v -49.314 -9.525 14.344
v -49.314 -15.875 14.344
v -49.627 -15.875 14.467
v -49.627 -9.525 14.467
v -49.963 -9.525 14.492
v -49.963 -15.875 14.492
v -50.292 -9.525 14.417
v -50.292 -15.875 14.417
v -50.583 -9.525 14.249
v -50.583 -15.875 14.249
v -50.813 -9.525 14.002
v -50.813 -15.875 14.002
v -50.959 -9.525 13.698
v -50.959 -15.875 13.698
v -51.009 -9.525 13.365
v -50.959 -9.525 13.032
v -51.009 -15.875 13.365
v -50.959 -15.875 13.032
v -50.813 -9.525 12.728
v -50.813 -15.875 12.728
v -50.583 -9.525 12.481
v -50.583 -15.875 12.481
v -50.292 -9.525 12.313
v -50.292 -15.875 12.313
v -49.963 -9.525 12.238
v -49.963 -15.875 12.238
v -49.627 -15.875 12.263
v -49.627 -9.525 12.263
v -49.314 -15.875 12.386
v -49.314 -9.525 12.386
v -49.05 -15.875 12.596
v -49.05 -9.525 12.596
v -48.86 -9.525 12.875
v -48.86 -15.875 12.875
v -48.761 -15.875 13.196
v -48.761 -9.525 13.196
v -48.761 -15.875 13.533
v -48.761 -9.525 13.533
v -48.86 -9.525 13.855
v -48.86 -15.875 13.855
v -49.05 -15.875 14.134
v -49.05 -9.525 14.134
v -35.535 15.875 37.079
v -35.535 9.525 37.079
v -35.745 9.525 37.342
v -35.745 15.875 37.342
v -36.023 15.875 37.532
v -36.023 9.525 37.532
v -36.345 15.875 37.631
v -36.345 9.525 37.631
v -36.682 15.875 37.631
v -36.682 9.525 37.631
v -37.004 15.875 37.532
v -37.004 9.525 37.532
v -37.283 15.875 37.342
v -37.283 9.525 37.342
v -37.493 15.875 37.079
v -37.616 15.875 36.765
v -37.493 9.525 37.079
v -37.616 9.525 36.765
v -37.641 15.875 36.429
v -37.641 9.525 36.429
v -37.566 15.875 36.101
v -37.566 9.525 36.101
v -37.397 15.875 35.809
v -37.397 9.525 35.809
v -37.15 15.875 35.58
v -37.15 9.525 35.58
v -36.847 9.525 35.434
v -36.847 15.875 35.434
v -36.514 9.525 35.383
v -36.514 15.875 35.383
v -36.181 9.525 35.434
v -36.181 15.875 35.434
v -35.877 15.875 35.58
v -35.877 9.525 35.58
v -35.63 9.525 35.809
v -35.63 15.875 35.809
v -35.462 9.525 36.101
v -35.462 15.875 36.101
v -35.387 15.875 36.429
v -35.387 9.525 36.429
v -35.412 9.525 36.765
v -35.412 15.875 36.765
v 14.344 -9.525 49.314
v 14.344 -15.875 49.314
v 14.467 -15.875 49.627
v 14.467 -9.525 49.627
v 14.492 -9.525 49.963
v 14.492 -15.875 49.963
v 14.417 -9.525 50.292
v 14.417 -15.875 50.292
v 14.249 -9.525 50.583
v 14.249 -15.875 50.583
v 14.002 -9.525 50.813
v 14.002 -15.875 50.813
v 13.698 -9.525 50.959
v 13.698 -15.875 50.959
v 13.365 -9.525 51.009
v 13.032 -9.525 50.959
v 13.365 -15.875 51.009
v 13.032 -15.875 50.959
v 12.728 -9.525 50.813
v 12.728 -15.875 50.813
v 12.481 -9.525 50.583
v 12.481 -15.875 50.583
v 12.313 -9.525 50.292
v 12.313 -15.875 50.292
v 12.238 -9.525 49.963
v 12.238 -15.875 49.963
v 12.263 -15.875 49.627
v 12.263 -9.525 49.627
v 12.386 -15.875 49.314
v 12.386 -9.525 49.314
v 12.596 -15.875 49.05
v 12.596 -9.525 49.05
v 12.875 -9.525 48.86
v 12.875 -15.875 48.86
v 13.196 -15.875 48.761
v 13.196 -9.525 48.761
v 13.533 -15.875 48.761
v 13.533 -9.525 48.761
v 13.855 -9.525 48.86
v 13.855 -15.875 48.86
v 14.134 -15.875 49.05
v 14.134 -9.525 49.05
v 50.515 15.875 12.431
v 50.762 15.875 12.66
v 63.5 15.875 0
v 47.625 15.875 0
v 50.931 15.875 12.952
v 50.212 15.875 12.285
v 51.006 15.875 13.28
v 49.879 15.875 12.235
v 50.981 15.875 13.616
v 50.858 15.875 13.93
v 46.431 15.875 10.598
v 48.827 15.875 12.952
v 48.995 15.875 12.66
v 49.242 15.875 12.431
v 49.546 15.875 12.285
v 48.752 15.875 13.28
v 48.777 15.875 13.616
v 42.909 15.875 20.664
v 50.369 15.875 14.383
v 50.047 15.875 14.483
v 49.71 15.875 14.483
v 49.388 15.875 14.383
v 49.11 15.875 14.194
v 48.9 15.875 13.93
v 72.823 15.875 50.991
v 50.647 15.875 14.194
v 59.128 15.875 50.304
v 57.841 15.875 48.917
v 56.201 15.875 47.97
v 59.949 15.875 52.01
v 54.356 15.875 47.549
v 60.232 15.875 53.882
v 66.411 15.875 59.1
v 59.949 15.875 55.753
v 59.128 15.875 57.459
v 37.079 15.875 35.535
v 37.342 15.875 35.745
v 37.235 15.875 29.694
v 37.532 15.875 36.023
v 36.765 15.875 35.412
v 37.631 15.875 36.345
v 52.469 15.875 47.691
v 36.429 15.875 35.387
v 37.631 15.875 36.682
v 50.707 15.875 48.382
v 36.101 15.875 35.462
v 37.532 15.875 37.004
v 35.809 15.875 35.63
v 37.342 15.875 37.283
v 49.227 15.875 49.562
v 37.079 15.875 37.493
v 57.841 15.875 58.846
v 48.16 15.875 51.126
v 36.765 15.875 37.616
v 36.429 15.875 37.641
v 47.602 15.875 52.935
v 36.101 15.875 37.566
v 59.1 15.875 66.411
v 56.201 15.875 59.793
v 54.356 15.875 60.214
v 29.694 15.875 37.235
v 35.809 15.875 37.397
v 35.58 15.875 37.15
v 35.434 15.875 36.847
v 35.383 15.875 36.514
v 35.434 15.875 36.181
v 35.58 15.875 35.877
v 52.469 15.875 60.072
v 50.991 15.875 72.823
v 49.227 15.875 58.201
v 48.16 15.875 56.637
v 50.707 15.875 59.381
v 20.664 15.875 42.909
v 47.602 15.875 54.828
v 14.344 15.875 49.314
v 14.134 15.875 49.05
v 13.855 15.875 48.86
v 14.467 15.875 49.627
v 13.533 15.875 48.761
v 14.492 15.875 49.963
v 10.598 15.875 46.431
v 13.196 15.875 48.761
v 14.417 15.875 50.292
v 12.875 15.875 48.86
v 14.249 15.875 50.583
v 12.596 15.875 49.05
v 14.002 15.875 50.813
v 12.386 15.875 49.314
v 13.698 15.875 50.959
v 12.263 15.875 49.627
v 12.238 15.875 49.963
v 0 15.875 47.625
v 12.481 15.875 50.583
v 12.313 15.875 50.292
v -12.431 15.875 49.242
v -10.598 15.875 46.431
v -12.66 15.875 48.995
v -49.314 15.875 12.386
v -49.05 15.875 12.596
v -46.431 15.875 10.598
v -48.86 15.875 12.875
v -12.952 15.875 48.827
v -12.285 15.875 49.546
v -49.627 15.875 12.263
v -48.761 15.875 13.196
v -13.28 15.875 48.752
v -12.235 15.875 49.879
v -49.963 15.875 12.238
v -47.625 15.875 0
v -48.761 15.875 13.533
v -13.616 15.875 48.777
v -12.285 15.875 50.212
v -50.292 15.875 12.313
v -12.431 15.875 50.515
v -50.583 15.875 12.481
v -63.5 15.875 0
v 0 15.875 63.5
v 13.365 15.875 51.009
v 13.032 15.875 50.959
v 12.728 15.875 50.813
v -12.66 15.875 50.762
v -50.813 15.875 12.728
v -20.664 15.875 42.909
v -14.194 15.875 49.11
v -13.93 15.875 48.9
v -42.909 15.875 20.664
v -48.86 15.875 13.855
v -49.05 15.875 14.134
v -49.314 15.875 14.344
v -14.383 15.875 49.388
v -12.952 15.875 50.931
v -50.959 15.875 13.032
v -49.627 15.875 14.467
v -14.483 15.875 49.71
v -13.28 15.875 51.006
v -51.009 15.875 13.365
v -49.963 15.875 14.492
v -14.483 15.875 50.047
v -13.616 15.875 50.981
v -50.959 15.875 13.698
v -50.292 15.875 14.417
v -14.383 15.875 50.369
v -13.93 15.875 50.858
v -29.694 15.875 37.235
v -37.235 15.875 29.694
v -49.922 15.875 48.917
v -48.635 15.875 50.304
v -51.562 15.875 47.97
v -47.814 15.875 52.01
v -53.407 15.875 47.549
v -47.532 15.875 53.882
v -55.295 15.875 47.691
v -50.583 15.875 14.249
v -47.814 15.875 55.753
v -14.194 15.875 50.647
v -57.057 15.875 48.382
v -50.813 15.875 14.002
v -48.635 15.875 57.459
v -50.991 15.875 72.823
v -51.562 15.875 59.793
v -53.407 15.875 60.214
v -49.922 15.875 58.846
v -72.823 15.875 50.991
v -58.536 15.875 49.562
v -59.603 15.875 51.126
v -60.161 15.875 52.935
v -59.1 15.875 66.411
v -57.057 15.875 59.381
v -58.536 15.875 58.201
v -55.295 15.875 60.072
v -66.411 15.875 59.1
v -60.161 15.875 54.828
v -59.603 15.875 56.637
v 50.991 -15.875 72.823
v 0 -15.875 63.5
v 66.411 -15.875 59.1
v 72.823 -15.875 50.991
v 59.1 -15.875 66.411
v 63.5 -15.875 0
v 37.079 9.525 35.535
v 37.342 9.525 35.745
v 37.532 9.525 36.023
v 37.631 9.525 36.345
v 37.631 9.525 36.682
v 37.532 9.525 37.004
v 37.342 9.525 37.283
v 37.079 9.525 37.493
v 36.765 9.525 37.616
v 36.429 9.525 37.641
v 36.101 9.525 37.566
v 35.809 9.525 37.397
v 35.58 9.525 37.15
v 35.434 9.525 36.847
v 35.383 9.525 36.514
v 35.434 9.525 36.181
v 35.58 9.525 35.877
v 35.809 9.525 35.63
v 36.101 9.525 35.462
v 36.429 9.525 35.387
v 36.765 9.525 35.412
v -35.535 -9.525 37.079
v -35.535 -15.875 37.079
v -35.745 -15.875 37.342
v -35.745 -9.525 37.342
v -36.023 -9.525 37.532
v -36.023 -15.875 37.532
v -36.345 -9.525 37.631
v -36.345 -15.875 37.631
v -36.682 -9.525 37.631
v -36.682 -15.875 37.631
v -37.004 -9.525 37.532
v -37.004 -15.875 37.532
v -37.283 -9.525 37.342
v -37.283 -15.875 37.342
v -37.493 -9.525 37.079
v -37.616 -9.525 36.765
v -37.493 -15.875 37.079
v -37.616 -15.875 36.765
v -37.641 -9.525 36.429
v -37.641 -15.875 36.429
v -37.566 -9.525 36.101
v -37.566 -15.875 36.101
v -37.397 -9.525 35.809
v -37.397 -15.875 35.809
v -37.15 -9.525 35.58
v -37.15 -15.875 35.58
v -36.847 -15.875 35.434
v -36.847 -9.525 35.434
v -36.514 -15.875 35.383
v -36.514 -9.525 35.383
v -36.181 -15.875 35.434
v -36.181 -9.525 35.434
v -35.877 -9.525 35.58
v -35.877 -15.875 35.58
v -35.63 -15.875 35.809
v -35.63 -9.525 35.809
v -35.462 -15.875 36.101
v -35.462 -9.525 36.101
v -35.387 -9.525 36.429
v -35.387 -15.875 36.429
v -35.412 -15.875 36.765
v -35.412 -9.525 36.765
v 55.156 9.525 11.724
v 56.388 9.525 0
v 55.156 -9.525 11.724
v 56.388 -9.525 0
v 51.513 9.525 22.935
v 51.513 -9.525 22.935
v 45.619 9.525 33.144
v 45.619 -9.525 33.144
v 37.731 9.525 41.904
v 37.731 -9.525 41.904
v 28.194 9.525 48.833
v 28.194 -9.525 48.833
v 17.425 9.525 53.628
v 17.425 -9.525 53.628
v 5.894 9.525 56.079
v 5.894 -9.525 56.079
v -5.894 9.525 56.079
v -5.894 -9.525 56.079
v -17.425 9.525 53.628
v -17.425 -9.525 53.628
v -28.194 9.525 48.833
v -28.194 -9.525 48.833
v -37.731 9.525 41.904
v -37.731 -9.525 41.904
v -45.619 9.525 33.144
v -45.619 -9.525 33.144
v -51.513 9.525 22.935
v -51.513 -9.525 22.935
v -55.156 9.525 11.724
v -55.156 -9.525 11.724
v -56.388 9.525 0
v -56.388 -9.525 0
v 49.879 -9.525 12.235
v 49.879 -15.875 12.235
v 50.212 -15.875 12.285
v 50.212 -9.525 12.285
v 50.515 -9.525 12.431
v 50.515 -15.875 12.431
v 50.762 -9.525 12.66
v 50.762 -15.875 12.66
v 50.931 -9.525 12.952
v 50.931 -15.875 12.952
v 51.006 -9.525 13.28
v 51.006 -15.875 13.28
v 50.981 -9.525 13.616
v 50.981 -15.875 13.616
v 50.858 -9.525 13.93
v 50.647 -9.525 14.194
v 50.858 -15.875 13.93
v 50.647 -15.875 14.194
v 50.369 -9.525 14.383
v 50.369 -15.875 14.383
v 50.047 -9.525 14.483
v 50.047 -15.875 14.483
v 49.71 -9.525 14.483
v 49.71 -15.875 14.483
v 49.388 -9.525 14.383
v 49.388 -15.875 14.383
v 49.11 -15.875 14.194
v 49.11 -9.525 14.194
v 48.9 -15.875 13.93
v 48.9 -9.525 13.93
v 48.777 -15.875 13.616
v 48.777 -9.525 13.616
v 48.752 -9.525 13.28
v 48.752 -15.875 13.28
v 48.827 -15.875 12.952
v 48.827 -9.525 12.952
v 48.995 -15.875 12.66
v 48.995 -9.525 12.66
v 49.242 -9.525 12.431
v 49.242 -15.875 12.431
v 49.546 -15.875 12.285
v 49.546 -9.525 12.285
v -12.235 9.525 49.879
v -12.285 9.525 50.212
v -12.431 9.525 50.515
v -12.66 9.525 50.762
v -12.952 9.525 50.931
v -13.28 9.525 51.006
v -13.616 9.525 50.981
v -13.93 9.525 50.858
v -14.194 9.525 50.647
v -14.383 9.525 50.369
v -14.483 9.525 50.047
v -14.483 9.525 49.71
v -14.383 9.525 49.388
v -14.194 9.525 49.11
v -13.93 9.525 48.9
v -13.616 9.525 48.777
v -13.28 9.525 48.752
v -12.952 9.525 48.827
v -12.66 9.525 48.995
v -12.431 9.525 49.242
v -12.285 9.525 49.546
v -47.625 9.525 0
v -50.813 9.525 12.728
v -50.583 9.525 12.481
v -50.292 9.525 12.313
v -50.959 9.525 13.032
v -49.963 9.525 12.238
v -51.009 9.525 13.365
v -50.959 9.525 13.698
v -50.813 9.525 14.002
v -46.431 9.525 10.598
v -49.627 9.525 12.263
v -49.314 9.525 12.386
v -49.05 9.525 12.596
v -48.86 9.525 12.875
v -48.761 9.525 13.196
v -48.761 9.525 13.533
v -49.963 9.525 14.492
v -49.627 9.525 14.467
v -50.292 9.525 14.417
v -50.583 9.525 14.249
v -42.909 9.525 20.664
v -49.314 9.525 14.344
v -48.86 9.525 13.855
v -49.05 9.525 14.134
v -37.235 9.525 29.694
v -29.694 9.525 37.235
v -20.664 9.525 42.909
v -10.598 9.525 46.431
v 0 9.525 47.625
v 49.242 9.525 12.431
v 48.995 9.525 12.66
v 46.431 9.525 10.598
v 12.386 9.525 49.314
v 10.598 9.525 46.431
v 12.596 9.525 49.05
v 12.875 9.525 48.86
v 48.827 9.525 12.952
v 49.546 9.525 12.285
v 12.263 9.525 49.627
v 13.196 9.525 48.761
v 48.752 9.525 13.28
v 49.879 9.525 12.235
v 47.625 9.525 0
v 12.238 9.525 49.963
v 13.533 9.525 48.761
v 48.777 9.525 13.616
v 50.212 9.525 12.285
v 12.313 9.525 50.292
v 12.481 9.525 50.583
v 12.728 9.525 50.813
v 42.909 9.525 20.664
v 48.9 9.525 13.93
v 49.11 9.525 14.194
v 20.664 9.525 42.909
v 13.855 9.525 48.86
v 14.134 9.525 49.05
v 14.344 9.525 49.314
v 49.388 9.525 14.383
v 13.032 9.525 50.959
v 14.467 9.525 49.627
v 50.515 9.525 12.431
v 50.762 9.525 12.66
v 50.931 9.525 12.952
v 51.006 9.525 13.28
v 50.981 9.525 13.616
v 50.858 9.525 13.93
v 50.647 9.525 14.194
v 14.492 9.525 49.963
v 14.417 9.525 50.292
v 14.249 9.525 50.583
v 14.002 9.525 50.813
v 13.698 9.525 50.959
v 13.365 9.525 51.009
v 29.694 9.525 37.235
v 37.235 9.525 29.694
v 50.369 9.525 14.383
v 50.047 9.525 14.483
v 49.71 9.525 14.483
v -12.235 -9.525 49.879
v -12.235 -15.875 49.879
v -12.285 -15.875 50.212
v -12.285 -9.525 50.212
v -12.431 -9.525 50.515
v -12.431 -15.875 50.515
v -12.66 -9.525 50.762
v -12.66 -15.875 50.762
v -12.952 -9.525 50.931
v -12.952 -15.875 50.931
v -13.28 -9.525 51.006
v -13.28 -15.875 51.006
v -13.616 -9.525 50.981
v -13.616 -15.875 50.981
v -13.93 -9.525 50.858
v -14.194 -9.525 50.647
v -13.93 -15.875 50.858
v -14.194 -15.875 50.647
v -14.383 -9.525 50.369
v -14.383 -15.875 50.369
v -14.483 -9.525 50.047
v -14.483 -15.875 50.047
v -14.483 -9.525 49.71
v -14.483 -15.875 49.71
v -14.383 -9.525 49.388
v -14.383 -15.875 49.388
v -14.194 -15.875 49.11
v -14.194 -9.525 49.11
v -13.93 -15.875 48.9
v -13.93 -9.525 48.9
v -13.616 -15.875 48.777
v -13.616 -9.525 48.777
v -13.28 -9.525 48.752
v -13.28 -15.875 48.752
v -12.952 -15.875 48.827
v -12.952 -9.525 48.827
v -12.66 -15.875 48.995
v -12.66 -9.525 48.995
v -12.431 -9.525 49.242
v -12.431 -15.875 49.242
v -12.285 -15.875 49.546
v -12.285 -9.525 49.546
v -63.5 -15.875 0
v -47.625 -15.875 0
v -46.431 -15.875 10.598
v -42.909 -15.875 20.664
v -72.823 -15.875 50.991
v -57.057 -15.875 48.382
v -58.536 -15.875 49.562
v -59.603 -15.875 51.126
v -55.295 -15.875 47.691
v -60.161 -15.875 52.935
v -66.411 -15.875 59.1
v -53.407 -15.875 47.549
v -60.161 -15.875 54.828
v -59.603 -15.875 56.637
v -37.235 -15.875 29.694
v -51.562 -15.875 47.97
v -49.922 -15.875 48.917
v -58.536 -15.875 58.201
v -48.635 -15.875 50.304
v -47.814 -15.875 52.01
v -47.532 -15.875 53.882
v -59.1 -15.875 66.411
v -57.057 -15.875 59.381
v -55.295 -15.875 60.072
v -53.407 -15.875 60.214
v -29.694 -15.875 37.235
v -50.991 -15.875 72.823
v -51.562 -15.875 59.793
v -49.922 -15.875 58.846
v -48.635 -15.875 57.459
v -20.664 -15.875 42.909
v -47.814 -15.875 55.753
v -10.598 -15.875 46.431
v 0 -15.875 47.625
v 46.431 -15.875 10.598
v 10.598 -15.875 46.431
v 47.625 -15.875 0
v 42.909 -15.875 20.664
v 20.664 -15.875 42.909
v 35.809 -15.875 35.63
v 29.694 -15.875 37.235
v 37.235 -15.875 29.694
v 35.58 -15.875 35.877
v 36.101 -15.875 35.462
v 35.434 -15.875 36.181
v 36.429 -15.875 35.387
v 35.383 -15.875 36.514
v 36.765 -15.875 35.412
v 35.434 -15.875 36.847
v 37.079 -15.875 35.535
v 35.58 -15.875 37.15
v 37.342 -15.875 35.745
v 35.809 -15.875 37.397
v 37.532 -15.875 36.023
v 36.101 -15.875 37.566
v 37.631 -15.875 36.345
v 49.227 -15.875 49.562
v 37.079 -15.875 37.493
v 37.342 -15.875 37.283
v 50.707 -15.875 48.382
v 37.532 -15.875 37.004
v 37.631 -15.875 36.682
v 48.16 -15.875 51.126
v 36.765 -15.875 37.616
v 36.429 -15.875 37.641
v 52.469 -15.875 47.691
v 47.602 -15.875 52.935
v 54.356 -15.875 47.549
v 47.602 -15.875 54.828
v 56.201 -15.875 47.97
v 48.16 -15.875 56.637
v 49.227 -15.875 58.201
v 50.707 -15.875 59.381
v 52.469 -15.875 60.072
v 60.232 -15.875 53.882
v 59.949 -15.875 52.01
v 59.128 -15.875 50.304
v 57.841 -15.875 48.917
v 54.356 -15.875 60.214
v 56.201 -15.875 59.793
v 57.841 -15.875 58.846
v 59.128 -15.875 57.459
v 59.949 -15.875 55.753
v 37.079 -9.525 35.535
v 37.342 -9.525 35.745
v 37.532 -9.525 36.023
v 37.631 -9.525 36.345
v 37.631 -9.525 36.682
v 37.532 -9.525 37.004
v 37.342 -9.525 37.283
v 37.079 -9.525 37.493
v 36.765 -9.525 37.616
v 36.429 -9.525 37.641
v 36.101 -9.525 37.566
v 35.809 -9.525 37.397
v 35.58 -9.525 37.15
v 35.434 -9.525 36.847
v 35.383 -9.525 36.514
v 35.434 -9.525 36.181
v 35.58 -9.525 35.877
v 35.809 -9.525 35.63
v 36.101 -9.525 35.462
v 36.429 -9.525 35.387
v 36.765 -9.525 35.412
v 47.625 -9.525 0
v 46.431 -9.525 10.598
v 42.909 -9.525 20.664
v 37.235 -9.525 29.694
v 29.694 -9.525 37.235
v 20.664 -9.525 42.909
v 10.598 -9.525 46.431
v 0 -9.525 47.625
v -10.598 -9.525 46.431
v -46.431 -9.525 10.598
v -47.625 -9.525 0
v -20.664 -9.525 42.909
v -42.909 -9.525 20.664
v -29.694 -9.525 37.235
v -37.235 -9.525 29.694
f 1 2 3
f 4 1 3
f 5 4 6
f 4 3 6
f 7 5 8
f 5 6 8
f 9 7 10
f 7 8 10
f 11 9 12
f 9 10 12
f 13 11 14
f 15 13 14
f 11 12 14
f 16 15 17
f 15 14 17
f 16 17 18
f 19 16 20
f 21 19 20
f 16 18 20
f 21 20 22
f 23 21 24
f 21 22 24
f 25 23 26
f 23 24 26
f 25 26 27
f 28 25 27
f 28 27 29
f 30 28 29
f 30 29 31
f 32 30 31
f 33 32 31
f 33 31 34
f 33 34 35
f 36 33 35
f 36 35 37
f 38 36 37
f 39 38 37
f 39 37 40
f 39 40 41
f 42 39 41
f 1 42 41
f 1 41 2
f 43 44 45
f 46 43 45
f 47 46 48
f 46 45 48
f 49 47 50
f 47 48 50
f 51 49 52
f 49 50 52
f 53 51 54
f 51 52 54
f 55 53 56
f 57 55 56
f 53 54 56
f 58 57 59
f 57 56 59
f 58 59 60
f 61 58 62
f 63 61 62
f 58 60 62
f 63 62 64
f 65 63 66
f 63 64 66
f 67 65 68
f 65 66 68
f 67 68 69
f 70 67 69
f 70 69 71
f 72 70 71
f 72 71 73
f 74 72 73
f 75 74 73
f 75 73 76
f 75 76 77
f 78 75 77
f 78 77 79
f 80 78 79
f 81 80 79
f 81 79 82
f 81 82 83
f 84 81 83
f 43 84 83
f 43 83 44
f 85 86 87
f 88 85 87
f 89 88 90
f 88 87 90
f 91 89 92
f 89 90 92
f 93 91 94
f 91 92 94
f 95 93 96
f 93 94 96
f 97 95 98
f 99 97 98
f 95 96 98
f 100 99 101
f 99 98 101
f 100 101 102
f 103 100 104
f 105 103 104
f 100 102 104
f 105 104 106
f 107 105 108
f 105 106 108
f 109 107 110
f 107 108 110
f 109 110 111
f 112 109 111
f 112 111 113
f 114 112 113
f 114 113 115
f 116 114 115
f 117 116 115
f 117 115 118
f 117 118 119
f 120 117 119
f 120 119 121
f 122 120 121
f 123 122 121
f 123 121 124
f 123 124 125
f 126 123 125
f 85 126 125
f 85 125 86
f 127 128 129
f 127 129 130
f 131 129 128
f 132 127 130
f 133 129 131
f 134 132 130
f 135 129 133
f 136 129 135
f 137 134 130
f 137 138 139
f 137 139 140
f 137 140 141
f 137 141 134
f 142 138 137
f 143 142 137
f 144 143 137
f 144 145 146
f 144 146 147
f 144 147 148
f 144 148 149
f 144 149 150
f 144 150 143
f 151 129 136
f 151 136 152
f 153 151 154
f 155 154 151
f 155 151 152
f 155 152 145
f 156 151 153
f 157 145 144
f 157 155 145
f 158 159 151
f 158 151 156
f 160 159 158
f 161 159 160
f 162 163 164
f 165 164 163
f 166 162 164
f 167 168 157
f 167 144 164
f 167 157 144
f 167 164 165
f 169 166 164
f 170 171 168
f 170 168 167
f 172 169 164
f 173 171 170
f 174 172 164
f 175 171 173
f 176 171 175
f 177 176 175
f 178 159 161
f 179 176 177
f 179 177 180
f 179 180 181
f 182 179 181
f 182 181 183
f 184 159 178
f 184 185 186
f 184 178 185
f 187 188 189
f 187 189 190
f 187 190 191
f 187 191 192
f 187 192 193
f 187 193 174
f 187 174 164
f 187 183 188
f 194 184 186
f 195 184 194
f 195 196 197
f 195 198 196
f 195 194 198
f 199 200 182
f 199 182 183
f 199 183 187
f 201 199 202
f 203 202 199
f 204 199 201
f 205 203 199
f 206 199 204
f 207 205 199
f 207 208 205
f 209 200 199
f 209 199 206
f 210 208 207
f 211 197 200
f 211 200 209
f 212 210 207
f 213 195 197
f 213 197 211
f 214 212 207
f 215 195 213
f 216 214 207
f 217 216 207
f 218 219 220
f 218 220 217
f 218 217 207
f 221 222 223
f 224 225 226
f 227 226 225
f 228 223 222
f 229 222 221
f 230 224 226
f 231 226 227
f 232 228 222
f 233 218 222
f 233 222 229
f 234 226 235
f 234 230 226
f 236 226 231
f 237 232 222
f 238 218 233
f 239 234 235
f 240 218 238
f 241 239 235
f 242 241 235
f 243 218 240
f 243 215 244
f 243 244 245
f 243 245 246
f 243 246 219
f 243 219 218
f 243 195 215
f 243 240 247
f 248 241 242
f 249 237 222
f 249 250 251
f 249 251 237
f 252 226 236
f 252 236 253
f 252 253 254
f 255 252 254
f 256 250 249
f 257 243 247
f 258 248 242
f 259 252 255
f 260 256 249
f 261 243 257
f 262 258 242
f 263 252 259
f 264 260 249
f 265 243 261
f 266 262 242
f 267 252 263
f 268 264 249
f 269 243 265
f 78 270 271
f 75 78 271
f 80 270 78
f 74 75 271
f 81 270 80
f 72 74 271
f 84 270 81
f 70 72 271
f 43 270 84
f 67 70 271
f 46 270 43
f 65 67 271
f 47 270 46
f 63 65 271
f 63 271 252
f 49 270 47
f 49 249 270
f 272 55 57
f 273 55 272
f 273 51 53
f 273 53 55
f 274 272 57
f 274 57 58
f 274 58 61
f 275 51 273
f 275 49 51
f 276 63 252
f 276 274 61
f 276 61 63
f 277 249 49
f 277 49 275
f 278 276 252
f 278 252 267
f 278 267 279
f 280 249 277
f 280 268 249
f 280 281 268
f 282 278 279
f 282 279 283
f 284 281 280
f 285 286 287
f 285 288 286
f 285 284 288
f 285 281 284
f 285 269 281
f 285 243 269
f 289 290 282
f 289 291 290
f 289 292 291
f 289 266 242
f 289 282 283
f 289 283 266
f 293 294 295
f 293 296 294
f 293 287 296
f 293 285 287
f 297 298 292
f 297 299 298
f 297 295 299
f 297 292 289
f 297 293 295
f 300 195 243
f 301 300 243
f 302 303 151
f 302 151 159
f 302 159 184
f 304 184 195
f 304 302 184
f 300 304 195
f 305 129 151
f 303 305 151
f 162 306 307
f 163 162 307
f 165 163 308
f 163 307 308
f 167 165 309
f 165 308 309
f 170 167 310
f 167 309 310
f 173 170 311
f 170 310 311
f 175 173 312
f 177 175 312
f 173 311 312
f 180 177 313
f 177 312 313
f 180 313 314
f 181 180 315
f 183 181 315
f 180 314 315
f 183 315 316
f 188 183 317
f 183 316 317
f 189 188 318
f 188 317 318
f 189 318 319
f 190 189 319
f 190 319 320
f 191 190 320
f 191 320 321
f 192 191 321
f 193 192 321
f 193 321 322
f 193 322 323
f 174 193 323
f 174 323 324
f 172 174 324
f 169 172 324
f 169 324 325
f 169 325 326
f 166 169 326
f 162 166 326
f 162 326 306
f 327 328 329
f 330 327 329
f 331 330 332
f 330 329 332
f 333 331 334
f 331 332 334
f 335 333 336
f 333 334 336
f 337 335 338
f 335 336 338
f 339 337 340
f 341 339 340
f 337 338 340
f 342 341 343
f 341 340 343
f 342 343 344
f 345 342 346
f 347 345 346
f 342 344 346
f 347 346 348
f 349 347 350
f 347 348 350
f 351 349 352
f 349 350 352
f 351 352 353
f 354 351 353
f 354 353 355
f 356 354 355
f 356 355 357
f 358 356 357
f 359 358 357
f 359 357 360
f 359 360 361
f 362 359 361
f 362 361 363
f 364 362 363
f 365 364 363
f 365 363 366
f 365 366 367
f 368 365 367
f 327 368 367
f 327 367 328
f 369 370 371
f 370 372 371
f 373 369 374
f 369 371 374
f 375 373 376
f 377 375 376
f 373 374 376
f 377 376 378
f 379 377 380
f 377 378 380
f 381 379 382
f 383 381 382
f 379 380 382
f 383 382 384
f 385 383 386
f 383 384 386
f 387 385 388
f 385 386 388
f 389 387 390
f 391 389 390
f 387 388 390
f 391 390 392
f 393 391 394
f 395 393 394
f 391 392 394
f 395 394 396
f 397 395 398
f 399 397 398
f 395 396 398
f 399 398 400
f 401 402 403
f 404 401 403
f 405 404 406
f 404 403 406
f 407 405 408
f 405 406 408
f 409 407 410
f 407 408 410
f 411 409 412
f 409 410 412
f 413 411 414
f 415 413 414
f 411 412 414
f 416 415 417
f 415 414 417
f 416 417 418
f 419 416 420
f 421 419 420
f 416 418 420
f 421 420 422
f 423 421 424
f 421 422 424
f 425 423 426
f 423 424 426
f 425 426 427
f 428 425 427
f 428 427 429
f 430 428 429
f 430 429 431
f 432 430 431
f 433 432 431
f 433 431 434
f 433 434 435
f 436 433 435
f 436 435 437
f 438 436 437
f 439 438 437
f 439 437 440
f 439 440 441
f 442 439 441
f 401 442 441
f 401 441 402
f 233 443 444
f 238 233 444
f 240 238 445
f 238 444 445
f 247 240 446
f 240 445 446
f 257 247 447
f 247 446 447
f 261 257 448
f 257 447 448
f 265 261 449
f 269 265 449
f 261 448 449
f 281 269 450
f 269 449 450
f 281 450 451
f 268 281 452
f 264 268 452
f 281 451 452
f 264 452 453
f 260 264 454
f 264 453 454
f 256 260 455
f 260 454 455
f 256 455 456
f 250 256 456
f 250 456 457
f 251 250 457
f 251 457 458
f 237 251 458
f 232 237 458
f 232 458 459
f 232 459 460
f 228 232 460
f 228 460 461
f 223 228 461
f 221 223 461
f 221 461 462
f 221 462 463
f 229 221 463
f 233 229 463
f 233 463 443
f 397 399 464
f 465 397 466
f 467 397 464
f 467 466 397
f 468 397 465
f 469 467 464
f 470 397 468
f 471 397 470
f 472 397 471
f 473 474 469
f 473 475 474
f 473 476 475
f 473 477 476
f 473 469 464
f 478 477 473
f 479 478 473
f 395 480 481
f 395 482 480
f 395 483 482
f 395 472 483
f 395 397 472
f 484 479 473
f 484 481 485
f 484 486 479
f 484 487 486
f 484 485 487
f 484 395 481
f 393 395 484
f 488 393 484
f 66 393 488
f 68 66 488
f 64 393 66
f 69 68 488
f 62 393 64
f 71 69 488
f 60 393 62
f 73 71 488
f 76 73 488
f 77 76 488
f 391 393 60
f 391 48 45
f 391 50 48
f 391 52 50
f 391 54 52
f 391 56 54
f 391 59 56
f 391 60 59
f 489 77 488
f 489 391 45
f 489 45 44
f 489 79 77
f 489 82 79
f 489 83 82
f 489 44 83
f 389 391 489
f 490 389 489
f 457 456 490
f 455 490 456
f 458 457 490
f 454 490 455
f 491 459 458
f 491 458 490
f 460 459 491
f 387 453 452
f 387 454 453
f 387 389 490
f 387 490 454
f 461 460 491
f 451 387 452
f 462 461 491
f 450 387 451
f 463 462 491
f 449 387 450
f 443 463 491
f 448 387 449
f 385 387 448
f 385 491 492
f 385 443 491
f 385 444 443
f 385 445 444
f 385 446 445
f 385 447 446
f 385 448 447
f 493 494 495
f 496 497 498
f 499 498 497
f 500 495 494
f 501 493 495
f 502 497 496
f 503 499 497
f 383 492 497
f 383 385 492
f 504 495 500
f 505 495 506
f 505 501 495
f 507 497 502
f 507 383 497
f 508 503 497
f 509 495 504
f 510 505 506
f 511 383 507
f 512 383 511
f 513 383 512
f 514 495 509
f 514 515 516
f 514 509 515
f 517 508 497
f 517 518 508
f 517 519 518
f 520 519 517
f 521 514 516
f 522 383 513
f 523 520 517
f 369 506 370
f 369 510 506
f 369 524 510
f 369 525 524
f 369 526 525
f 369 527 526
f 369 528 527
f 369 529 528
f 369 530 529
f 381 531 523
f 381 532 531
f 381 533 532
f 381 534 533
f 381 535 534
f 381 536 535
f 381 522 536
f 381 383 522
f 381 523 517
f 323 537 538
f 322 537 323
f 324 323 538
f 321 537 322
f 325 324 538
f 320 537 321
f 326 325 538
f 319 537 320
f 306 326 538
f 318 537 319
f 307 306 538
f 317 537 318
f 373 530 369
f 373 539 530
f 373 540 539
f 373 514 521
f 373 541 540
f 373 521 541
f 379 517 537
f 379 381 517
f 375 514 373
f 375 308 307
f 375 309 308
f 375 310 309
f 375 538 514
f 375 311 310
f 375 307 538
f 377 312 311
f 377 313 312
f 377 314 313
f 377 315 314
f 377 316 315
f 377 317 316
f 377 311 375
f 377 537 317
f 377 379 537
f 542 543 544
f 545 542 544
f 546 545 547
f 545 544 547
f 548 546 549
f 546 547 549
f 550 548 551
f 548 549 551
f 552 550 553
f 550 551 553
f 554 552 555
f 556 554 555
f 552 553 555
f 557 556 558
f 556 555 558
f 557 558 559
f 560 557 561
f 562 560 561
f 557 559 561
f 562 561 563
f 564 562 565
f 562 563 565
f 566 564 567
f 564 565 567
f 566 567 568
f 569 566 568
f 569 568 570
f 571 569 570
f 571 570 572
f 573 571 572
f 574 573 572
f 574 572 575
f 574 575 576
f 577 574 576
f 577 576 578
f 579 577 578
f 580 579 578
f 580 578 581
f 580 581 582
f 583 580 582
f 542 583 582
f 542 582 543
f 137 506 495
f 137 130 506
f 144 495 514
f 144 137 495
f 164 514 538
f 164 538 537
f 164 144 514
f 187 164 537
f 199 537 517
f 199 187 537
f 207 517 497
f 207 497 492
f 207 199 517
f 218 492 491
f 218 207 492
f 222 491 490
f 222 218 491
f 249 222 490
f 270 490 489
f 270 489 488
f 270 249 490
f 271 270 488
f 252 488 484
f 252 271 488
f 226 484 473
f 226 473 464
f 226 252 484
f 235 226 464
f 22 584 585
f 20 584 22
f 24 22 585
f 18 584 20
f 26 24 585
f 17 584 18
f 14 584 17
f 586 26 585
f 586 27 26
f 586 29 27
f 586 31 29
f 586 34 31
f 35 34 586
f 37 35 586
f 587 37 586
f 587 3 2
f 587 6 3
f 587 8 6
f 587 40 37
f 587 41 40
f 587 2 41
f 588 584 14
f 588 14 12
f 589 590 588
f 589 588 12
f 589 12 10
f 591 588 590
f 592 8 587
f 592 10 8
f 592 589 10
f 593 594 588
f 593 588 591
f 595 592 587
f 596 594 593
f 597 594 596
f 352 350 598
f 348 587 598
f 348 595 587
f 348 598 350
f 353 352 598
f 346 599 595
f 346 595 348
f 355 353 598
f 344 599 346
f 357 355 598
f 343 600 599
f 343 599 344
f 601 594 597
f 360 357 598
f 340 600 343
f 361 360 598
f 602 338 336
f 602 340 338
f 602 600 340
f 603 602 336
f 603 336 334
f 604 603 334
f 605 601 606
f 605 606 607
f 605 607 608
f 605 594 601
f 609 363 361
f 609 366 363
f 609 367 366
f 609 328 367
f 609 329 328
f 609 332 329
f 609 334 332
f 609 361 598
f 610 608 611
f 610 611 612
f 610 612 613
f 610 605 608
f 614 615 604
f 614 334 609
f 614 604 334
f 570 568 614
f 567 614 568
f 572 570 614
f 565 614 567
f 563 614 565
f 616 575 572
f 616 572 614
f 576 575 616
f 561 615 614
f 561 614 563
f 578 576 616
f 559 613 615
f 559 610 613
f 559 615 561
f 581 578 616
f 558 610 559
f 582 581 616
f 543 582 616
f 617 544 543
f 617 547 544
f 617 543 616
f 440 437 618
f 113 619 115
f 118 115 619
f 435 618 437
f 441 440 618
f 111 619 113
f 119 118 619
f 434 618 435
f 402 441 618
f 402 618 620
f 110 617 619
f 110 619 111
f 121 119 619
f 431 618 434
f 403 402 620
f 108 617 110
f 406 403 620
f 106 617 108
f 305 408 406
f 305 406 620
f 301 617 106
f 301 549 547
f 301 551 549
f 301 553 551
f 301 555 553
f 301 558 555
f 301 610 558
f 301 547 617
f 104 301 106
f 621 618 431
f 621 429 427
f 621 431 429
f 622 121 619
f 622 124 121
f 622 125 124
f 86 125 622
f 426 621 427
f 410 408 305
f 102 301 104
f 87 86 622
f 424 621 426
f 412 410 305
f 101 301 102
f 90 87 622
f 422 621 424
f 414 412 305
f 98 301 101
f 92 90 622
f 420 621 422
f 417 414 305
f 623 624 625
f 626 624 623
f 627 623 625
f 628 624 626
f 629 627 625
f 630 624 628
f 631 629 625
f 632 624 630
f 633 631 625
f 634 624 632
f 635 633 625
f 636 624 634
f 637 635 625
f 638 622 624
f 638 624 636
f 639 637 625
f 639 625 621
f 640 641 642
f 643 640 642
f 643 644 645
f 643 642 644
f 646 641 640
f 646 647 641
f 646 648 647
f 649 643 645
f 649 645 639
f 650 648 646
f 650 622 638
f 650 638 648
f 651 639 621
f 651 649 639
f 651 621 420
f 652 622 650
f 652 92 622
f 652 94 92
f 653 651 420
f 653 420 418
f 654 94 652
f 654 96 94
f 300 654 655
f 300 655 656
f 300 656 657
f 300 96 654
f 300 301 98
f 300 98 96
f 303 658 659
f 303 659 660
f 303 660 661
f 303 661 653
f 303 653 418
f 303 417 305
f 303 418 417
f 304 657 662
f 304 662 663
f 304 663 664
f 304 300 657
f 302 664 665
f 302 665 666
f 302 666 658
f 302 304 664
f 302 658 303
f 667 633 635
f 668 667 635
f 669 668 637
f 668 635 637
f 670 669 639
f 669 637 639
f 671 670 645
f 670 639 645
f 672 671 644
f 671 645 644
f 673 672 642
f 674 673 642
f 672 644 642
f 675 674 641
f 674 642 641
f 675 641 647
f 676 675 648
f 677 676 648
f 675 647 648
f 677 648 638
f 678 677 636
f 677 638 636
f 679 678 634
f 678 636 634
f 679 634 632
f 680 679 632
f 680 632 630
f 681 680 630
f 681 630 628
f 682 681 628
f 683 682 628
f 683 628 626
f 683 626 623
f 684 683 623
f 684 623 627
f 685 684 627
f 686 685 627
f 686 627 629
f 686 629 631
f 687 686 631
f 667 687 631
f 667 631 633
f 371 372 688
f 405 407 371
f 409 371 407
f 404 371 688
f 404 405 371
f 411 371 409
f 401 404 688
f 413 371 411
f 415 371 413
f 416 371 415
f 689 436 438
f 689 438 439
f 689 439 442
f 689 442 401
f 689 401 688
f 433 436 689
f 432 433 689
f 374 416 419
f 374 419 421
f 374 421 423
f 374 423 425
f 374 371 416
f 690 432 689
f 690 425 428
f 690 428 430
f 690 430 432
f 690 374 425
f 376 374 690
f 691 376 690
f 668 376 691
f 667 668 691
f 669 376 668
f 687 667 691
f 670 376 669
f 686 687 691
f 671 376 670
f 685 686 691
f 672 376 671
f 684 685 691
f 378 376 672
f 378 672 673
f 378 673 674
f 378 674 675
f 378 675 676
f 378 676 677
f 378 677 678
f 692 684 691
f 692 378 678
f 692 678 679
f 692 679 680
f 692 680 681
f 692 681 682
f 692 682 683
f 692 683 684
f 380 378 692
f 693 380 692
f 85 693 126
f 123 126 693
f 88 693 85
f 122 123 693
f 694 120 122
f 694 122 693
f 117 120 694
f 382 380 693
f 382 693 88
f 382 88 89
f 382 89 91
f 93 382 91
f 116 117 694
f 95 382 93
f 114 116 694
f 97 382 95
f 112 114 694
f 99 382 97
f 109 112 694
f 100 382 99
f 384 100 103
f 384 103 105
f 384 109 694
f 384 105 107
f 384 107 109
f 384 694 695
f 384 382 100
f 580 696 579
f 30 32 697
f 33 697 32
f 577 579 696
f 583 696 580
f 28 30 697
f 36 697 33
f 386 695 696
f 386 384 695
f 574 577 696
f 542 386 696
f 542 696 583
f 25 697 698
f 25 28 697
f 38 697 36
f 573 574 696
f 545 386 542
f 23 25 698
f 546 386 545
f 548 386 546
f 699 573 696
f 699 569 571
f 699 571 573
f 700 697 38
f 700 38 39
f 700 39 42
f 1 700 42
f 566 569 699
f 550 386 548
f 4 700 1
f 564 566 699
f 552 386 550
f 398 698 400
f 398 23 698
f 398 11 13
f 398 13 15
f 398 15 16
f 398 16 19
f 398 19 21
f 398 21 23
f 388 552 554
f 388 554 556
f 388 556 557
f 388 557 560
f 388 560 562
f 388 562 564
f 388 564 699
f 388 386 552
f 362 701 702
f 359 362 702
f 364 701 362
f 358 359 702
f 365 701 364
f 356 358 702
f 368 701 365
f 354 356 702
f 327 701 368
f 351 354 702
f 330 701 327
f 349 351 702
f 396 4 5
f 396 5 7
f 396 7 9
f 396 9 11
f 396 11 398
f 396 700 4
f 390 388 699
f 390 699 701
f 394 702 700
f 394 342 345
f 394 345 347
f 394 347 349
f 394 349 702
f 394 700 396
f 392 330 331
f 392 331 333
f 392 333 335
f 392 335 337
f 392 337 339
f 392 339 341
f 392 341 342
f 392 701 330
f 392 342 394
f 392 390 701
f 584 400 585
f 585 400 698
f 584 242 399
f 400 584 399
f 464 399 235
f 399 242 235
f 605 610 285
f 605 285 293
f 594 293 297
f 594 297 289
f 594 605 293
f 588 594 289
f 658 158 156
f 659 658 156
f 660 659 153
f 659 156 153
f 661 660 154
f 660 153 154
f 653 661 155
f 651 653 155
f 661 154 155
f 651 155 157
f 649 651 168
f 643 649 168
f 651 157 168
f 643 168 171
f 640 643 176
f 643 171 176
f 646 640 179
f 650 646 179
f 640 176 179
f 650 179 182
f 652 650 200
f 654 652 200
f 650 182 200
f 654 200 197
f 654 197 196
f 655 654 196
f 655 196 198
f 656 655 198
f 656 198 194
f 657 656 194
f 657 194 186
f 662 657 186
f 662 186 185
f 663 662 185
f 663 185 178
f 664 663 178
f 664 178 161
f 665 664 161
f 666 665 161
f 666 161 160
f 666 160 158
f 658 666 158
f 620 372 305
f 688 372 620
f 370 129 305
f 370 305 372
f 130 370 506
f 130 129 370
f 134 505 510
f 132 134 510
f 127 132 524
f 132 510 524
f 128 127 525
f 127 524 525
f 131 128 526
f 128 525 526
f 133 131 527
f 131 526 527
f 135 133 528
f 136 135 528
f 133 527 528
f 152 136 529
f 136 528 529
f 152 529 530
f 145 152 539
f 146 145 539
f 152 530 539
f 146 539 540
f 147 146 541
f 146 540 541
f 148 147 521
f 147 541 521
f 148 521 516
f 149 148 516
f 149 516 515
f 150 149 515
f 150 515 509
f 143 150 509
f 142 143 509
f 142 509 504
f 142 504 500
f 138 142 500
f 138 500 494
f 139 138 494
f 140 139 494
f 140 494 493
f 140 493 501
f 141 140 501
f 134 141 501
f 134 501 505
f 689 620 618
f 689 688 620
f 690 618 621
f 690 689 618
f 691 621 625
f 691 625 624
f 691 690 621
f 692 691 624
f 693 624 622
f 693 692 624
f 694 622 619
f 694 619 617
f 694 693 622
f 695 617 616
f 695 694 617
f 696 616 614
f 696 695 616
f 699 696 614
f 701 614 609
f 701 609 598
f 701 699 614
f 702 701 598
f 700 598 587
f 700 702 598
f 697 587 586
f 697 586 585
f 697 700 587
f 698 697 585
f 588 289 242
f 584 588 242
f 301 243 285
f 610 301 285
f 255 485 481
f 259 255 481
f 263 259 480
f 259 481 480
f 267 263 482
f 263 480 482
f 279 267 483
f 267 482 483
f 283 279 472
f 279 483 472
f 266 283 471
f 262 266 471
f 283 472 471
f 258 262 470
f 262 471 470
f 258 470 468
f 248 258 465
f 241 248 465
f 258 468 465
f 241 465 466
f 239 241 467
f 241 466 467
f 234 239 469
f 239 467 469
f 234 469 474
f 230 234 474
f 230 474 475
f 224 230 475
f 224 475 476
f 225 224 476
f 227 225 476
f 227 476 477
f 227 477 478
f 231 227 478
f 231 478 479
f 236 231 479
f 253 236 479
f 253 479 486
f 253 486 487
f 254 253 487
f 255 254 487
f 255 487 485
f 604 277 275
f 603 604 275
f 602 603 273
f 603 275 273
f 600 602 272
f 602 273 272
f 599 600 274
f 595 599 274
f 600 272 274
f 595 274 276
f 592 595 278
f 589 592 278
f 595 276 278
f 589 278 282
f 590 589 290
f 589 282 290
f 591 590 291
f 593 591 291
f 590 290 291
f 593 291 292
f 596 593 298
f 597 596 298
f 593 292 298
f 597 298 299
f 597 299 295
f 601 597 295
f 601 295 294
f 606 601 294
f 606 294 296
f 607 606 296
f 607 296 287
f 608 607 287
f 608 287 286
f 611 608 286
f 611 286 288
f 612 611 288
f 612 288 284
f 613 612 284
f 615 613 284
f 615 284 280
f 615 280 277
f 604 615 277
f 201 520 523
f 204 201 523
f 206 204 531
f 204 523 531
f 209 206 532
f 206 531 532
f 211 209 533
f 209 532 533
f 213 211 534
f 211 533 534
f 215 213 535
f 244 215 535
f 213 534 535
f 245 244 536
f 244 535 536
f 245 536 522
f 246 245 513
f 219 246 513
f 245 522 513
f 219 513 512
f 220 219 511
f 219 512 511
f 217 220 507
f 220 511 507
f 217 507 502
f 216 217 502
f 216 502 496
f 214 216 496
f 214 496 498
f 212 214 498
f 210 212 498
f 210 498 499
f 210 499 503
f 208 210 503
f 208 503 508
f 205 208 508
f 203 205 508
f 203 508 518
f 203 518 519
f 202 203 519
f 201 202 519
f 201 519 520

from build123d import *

# Parameters (mm, degrees)
REVOLVE1_ANGLE                 = 180
TAP_DRILL_FOR_4_40_TAP1_D      = 2.2606
CIRPATTERN1_COUNT              = 12
CUT_EXTRUDE1_REACH             = 90.9
SKETCH4_R                      = 1.1303
CUT_EXTRUDE2_REACH             = 90.9
SKETCH6_R                      = 1.1303
CUT_EXTRUDE2_DIRECTION_2_DEPTH = 1.0000001
CUT_EXTRUDE3_REACH             = 33.75
SKETCH7_R                      = 6.35


with BuildPart() as part:
    # Sketch1 → Revolve1 (revolve)
    with BuildSketch(Plane.XY):
        Polygon((56.388, 0), (56.388, 9.525), (47.625, 9.525), (47.625, 15.875), (88.9, 15.875), (88.9, -15.875), (47.625, -15.875), (47.625, -9.525), (56.388, -9.525), align=None)
    revolve(axis=Axis((0, 22.539286723, 0), (0, -1, 0)), revolution_arc=REVOLVE1_ANGLE)

    # Tap Drill for #4-40 Tap1 (through all)
    with Locations(Plane(origin=(49.878671003, 15.875, 13.364949615), x_dir=(0, 0, 1), z_dir=(0, 1, 0))):
        with Locations((0, 0)):
            tap_drill_for_4_40_tap1 = Hole(TAP_DRILL_FOR_4_40_TAP1_D / 2)

    # CirPattern1: Tap Drill for #4-40 Tap1 ×12 about axis, 6 skipped
    cirpattern1_axis = Axis((0, 15.875, 0), (0, 1, 0))
    add([tap_drill_for_4_40_tap1.rotate(cirpattern1_axis, i * 360 / CIRPATTERN1_COUNT) for i in range(1, CIRPATTERN1_COUNT) if i not in (1, 2, 3, 4, 5, 6)], mode=Mode.SUBTRACT)

    # Sketch4 → Cut-Extrude1 (cut, up to next)
    with BuildSketch(Plane(origin=(0, 0, 0), x_dir=(-1, 0, 0), z_dir=(0, 0, -1)), mode=Mode.PRIVATE) as cut_extrude1_sk1:
        with Locations((82.55, 6.35)):
            Circle(SKETCH4_R)
    cut_extrude1_tool1 = extrude(cut_extrude1_sk1.sketch, amount=-CUT_EXTRUDE1_REACH, mode=Mode.PRIVATE) & part.part
    add(cut_extrude1_tool1.solids().sort_by_distance((-82.55, 6.35, 0))[0], mode=Mode.SUBTRACT)
    # Sketch4 → Cut-Extrude1 (cut, up to next)
    with BuildSketch(Plane(origin=(0, 0, 0), x_dir=(-1, 0, 0), z_dir=(0, 0, -1)), mode=Mode.PRIVATE) as cut_extrude1_sk2:
        with Locations((82.55, -6.35)):
            Circle(SKETCH4_R)
    cut_extrude1_tool2 = extrude(cut_extrude1_sk2.sketch, amount=-CUT_EXTRUDE1_REACH, mode=Mode.PRIVATE) & part.part
    add(cut_extrude1_tool2.solids().sort_by_distance((-82.55, -6.35, 0))[0], mode=Mode.SUBTRACT)

    # Sketch6 → Cut-Extrude2 (cut, up to next)
    with BuildSketch(Plane(origin=(0, 0, 0), x_dir=(-1, 0, 0), z_dir=(0, 0, -1)), mode=Mode.PRIVATE) as cut_extrude2_sk1:
        with Locations((-82.55, 6.35)):
            Circle(SKETCH6_R)
    cut_extrude2_tool1 = extrude(cut_extrude2_sk1.sketch, amount=-CUT_EXTRUDE2_REACH, mode=Mode.PRIVATE) & part.part
    add(cut_extrude2_tool1.solids().sort_by_distance((82.55, 6.35, 0))[0], mode=Mode.SUBTRACT)
    # Sketch6 → Cut-Extrude2 (cut, up to next)
    with BuildSketch(Plane(origin=(0, 0, 0), x_dir=(-1, 0, 0), z_dir=(0, 0, -1)), mode=Mode.PRIVATE) as cut_extrude2_sk2:
        with Locations((-82.579243869, -6.35)):
            Circle(SKETCH6_R)
    cut_extrude2_tool2 = extrude(cut_extrude2_sk2.sketch, amount=-CUT_EXTRUDE2_REACH, mode=Mode.PRIVATE) & part.part
    add(cut_extrude2_tool2.solids().sort_by_distance((82.579244, -6.35, 0))[0], mode=Mode.SUBTRACT)

    # Sketch6 → Cut-Extrude2 direction 2 (cut)
    with BuildSketch(Plane(origin=(0, 0, 0), x_dir=(-1, 0, 0), z_dir=(0, 0, -1))):
        with Locations((-82.55, 6.35)):
            Circle(SKETCH6_R)
        with Locations((-82.579243869, -6.35)):
            Circle(SKETCH6_R)
    extrude(amount=CUT_EXTRUDE2_DIRECTION_2_DEPTH, mode=Mode.SUBTRACT)

    # Sketch7 → Cut-Extrude3 (cut, up to next)
    with BuildSketch(Plane(origin=(0, 15.875, 0), x_dir=(1, 0, 0), z_dir=(0, 1, 0)), mode=Mode.PRIVATE) as cut_extrude3_sk1:
        with Locations((53.881536726, -53.881536726)):
            Circle(SKETCH7_R)
    cut_extrude3_tool1 = extrude(cut_extrude3_sk1.sketch, amount=-CUT_EXTRUDE3_REACH, mode=Mode.PRIVATE) & part.part
    add(cut_extrude3_tool1.solids().sort_by_distance((53.881537, 15.875, 53.881537))[0], mode=Mode.SUBTRACT)
    # Sketch7 → Cut-Extrude3 (cut, up to next)
    with BuildSketch(Plane(origin=(0, 15.875, 0), x_dir=(1, 0, 0), z_dir=(0, 1, 0)), mode=Mode.PRIVATE) as cut_extrude3_sk2:
        with Locations((-53.881536726, -53.881536726)):
            Circle(SKETCH7_R)
    cut_extrude3_tool2 = extrude(cut_extrude3_sk2.sketch, amount=-CUT_EXTRUDE3_REACH, mode=Mode.PRIVATE) & part.part
    add(cut_extrude3_tool2.solids().sort_by_distance((-53.881537, 15.875, 53.881537))[0], mode=Mode.SUBTRACT)
    # Sketch7 → Cut-Extrude3 (cut, up to next)
    with BuildSketch(Plane(origin=(0, 15.875, 0), x_dir=(1, 0, 0), z_dir=(0, 1, 0)), mode=Mode.PRIVATE) as cut_extrude3_sk3:
        with BuildLine():
            ThreePointArc((-50.990945192, -72.822616737), (0, -88.9), (50.990945192, -72.822616737))
            Line((50.990945192, -72.822616737), (0, -63.5))
            Line((0, -63.5), (-50.990945192, -72.822616737))
        make_face()
    cut_extrude3_tool3 = extrude(cut_extrude3_sk3.sketch, amount=-CUT_EXTRUDE3_REACH, mode=Mode.PRIVATE) & part.part
    add(cut_extrude3_tool3.solids().sort_by_distance((0, 15.875, 76.438451))[0], mode=Mode.SUBTRACT)
    # Sketch7 → Cut-Extrude3 (cut, up to next)
    with BuildSketch(Plane(origin=(0, 15.875, 0), x_dir=(1, 0, 0), z_dir=(0, 1, 0)), mode=Mode.PRIVATE) as cut_extrude3_sk4:
        with BuildLine():
            Line((63.5, 0), (72.822616737, -50.990945192))
            ThreePointArc((72.822616737, -50.990945192), (84.785436922, -26.732745576), (88.9, 0))
            Line((88.9, 0), (63.5, 0))
        make_face()
    cut_extrude3_tool4 = extrude(cut_extrude3_sk4.sketch, amount=-CUT_EXTRUDE3_REACH, mode=Mode.PRIVATE) & part.part
    add(cut_extrude3_tool4.solids().sort_by_distance((76.438451, 15.875, 18.664198))[0], mode=Mode.SUBTRACT)
    # Sketch7 → Cut-Extrude3 (cut, up to next)
    with BuildSketch(Plane(origin=(0, 15.875, 0), x_dir=(1, 0, 0), z_dir=(0, 1, 0)), mode=Mode.PRIVATE) as cut_extrude3_sk5:
        with BuildLine():
            Line((-72.822616737, -50.990945192), (-63.5, 0))
            Line((-63.5, 0), (-88.9, 0))
            ThreePointArc((-88.9, 0), (-84.785436922, -26.732745576), (-72.822616737, -50.990945192))
        make_face()
    cut_extrude3_tool5 = extrude(cut_extrude3_sk5.sketch, amount=-CUT_EXTRUDE3_REACH, mode=Mode.PRIVATE) & part.part
    add(cut_extrude3_tool5.solids().sort_by_distance((-76.438451, 15.875, 18.664198))[0], mode=Mode.SUBTRACT)


solid = part.part
